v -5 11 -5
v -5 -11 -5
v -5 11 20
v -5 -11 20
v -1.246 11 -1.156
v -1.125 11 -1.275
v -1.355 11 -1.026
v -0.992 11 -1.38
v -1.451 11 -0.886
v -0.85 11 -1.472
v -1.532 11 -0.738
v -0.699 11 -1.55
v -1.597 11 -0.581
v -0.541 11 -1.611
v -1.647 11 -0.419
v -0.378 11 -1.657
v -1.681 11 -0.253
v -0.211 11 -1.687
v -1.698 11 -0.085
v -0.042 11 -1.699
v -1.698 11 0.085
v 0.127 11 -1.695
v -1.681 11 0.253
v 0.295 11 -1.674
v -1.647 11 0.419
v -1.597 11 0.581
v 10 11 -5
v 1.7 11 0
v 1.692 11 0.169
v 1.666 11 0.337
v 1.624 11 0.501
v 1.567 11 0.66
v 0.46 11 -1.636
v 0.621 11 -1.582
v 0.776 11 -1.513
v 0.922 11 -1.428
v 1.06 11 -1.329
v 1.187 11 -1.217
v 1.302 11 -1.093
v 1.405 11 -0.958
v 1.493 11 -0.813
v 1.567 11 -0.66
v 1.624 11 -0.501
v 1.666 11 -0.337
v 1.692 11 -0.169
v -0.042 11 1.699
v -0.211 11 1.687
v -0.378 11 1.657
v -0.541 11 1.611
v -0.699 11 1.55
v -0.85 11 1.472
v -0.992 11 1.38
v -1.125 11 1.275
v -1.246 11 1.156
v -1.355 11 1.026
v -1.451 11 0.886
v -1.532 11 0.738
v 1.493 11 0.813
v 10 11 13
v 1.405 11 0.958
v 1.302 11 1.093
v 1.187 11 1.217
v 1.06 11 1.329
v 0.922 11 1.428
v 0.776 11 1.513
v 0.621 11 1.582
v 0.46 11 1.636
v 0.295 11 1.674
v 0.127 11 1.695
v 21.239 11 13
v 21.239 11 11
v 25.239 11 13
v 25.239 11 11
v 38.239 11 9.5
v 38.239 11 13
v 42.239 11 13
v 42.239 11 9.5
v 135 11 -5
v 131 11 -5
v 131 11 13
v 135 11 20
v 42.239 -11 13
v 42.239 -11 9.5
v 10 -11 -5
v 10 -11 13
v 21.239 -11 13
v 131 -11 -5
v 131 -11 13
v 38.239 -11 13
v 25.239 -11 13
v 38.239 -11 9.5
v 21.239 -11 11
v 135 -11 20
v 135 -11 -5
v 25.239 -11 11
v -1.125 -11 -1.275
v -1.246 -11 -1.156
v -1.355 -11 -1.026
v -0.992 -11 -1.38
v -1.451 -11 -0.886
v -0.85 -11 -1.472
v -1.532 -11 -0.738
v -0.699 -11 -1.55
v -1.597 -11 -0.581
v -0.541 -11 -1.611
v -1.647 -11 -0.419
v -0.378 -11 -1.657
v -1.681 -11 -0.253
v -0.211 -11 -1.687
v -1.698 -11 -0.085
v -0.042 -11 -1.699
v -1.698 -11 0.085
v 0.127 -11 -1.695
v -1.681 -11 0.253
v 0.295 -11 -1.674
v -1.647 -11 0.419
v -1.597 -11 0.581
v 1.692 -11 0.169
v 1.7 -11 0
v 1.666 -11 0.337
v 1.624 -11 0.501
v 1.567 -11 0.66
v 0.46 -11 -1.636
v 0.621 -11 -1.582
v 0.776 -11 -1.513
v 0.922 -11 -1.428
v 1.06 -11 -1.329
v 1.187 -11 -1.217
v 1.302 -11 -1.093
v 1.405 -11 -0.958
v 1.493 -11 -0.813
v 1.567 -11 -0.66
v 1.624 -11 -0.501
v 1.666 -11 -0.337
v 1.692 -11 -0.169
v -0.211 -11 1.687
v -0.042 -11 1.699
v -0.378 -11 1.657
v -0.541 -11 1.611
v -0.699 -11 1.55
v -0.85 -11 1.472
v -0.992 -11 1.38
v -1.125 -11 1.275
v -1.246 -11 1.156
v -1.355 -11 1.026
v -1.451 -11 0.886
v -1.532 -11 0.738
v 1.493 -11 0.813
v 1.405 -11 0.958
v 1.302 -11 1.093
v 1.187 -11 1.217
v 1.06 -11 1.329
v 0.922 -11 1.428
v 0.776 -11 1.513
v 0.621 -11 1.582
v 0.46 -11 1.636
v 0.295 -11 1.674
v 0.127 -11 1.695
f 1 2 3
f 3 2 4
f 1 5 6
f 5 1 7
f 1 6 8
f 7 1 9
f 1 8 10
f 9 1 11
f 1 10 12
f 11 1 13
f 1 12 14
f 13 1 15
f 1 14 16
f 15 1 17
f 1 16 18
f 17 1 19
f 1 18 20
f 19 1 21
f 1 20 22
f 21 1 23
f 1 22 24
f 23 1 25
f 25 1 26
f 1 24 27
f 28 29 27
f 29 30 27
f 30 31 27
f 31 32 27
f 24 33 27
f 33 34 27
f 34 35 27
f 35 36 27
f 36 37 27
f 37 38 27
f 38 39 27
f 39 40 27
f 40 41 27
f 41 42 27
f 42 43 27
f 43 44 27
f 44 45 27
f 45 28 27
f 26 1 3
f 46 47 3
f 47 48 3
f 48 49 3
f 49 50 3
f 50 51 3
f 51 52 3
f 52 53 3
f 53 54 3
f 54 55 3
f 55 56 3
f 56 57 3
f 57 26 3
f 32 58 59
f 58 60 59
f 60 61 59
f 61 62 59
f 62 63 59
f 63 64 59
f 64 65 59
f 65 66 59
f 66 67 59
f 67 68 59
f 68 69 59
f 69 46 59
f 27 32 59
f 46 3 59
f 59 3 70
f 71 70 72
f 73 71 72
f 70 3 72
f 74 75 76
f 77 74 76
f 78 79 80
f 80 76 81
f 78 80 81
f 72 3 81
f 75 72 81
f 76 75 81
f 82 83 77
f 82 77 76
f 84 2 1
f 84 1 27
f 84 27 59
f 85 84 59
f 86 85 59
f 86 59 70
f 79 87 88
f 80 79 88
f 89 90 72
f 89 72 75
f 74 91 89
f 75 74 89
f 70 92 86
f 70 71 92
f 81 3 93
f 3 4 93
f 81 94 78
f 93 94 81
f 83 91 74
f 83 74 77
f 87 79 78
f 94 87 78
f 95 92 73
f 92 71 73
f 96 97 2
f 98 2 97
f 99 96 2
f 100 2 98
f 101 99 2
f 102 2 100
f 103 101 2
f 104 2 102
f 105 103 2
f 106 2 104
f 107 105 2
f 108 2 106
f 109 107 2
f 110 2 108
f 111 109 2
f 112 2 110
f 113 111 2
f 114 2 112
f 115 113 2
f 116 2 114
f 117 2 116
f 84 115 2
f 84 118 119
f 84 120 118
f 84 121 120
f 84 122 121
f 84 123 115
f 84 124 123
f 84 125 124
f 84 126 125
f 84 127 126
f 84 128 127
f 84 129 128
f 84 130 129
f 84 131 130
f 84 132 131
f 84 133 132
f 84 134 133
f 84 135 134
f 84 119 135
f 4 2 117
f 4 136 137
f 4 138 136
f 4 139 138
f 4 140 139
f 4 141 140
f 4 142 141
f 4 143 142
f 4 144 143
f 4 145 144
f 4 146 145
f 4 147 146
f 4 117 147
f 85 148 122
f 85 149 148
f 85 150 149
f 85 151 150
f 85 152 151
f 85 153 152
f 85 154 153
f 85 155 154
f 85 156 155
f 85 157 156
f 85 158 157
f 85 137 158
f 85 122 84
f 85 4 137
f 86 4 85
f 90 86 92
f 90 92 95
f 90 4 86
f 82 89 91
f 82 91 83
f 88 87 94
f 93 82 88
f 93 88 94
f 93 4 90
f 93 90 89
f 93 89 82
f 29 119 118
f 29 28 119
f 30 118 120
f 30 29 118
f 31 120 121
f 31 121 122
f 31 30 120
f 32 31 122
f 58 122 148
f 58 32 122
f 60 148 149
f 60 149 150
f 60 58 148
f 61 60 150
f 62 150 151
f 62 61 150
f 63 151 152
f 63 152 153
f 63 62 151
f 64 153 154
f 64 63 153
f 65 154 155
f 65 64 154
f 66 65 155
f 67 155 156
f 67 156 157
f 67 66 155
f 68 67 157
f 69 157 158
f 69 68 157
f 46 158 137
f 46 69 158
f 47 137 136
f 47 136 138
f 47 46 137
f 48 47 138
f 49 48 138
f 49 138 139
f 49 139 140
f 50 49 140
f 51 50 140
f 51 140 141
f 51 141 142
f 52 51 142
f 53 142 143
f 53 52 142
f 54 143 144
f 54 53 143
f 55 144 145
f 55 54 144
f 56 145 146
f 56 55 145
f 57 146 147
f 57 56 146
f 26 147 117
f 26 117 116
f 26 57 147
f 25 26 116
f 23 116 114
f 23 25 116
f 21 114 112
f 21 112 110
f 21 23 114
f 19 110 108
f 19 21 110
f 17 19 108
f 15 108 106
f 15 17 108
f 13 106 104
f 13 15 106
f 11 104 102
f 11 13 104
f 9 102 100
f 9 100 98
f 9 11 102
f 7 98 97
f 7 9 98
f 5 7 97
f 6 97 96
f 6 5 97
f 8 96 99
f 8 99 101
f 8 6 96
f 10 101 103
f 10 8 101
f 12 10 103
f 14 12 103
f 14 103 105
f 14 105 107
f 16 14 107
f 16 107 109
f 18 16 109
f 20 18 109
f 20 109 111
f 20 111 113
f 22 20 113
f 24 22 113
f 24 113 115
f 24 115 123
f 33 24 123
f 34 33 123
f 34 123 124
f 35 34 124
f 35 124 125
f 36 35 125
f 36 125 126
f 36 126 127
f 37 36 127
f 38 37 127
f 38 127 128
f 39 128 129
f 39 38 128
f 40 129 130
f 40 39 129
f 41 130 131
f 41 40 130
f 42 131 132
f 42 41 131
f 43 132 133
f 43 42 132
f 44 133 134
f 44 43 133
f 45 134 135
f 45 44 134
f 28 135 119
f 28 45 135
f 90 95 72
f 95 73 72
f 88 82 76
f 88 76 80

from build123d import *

# Parameters (mm, degrees)
SKETCH_W          = 140
SKETCH_H          = 25
SKETCH_R          = 1.7
PAD_DEPTH         = 11
SKETCH001_W       = 121
SKETCH001_H       = 18
POCKET_DEPTH      = 11.001
POCKET_DEPTH_BACK = 11.001
SKETCH002_W       = 4
SKETCH002_H       = 2
SKETCH002_H_2     = 3.5
PAD001_DEPTH      = 11


with BuildPart() as part:
    # Sketch → Pad (new body, symmetric)
    with BuildSketch(Plane.XZ):
        with Locations((65, 7.5)):
            Rectangle(SKETCH_W, SKETCH_H)
        Circle(SKETCH_R, mode=Mode.SUBTRACT)
    extrude(amount=PAD_DEPTH, both=True)

    # Sketch001 → Pocket (cut, two sides)
    with BuildSketch(Plane.XZ) as pocket_sk:
        with Locations((70.5, 4)):
            Rectangle(SKETCH001_W, SKETCH001_H)
    extrude(amount=-POCKET_DEPTH, mode=Mode.SUBTRACT)
    extrude(pocket_sk.sketch, amount=POCKET_DEPTH_BACK, mode=Mode.SUBTRACT)

    # Sketch002 → Pad001 (join, symmetric)
    with BuildSketch(Plane.XZ):
        with Locations((23.239084, 12)):
            Rectangle(SKETCH002_W, SKETCH002_H)
        with Locations((40.239084, 11.25)):
            Rectangle(SKETCH002_W, SKETCH002_H_2)
    extrude(amount=PAD001_DEPTH, both=True)


solid = part.part
